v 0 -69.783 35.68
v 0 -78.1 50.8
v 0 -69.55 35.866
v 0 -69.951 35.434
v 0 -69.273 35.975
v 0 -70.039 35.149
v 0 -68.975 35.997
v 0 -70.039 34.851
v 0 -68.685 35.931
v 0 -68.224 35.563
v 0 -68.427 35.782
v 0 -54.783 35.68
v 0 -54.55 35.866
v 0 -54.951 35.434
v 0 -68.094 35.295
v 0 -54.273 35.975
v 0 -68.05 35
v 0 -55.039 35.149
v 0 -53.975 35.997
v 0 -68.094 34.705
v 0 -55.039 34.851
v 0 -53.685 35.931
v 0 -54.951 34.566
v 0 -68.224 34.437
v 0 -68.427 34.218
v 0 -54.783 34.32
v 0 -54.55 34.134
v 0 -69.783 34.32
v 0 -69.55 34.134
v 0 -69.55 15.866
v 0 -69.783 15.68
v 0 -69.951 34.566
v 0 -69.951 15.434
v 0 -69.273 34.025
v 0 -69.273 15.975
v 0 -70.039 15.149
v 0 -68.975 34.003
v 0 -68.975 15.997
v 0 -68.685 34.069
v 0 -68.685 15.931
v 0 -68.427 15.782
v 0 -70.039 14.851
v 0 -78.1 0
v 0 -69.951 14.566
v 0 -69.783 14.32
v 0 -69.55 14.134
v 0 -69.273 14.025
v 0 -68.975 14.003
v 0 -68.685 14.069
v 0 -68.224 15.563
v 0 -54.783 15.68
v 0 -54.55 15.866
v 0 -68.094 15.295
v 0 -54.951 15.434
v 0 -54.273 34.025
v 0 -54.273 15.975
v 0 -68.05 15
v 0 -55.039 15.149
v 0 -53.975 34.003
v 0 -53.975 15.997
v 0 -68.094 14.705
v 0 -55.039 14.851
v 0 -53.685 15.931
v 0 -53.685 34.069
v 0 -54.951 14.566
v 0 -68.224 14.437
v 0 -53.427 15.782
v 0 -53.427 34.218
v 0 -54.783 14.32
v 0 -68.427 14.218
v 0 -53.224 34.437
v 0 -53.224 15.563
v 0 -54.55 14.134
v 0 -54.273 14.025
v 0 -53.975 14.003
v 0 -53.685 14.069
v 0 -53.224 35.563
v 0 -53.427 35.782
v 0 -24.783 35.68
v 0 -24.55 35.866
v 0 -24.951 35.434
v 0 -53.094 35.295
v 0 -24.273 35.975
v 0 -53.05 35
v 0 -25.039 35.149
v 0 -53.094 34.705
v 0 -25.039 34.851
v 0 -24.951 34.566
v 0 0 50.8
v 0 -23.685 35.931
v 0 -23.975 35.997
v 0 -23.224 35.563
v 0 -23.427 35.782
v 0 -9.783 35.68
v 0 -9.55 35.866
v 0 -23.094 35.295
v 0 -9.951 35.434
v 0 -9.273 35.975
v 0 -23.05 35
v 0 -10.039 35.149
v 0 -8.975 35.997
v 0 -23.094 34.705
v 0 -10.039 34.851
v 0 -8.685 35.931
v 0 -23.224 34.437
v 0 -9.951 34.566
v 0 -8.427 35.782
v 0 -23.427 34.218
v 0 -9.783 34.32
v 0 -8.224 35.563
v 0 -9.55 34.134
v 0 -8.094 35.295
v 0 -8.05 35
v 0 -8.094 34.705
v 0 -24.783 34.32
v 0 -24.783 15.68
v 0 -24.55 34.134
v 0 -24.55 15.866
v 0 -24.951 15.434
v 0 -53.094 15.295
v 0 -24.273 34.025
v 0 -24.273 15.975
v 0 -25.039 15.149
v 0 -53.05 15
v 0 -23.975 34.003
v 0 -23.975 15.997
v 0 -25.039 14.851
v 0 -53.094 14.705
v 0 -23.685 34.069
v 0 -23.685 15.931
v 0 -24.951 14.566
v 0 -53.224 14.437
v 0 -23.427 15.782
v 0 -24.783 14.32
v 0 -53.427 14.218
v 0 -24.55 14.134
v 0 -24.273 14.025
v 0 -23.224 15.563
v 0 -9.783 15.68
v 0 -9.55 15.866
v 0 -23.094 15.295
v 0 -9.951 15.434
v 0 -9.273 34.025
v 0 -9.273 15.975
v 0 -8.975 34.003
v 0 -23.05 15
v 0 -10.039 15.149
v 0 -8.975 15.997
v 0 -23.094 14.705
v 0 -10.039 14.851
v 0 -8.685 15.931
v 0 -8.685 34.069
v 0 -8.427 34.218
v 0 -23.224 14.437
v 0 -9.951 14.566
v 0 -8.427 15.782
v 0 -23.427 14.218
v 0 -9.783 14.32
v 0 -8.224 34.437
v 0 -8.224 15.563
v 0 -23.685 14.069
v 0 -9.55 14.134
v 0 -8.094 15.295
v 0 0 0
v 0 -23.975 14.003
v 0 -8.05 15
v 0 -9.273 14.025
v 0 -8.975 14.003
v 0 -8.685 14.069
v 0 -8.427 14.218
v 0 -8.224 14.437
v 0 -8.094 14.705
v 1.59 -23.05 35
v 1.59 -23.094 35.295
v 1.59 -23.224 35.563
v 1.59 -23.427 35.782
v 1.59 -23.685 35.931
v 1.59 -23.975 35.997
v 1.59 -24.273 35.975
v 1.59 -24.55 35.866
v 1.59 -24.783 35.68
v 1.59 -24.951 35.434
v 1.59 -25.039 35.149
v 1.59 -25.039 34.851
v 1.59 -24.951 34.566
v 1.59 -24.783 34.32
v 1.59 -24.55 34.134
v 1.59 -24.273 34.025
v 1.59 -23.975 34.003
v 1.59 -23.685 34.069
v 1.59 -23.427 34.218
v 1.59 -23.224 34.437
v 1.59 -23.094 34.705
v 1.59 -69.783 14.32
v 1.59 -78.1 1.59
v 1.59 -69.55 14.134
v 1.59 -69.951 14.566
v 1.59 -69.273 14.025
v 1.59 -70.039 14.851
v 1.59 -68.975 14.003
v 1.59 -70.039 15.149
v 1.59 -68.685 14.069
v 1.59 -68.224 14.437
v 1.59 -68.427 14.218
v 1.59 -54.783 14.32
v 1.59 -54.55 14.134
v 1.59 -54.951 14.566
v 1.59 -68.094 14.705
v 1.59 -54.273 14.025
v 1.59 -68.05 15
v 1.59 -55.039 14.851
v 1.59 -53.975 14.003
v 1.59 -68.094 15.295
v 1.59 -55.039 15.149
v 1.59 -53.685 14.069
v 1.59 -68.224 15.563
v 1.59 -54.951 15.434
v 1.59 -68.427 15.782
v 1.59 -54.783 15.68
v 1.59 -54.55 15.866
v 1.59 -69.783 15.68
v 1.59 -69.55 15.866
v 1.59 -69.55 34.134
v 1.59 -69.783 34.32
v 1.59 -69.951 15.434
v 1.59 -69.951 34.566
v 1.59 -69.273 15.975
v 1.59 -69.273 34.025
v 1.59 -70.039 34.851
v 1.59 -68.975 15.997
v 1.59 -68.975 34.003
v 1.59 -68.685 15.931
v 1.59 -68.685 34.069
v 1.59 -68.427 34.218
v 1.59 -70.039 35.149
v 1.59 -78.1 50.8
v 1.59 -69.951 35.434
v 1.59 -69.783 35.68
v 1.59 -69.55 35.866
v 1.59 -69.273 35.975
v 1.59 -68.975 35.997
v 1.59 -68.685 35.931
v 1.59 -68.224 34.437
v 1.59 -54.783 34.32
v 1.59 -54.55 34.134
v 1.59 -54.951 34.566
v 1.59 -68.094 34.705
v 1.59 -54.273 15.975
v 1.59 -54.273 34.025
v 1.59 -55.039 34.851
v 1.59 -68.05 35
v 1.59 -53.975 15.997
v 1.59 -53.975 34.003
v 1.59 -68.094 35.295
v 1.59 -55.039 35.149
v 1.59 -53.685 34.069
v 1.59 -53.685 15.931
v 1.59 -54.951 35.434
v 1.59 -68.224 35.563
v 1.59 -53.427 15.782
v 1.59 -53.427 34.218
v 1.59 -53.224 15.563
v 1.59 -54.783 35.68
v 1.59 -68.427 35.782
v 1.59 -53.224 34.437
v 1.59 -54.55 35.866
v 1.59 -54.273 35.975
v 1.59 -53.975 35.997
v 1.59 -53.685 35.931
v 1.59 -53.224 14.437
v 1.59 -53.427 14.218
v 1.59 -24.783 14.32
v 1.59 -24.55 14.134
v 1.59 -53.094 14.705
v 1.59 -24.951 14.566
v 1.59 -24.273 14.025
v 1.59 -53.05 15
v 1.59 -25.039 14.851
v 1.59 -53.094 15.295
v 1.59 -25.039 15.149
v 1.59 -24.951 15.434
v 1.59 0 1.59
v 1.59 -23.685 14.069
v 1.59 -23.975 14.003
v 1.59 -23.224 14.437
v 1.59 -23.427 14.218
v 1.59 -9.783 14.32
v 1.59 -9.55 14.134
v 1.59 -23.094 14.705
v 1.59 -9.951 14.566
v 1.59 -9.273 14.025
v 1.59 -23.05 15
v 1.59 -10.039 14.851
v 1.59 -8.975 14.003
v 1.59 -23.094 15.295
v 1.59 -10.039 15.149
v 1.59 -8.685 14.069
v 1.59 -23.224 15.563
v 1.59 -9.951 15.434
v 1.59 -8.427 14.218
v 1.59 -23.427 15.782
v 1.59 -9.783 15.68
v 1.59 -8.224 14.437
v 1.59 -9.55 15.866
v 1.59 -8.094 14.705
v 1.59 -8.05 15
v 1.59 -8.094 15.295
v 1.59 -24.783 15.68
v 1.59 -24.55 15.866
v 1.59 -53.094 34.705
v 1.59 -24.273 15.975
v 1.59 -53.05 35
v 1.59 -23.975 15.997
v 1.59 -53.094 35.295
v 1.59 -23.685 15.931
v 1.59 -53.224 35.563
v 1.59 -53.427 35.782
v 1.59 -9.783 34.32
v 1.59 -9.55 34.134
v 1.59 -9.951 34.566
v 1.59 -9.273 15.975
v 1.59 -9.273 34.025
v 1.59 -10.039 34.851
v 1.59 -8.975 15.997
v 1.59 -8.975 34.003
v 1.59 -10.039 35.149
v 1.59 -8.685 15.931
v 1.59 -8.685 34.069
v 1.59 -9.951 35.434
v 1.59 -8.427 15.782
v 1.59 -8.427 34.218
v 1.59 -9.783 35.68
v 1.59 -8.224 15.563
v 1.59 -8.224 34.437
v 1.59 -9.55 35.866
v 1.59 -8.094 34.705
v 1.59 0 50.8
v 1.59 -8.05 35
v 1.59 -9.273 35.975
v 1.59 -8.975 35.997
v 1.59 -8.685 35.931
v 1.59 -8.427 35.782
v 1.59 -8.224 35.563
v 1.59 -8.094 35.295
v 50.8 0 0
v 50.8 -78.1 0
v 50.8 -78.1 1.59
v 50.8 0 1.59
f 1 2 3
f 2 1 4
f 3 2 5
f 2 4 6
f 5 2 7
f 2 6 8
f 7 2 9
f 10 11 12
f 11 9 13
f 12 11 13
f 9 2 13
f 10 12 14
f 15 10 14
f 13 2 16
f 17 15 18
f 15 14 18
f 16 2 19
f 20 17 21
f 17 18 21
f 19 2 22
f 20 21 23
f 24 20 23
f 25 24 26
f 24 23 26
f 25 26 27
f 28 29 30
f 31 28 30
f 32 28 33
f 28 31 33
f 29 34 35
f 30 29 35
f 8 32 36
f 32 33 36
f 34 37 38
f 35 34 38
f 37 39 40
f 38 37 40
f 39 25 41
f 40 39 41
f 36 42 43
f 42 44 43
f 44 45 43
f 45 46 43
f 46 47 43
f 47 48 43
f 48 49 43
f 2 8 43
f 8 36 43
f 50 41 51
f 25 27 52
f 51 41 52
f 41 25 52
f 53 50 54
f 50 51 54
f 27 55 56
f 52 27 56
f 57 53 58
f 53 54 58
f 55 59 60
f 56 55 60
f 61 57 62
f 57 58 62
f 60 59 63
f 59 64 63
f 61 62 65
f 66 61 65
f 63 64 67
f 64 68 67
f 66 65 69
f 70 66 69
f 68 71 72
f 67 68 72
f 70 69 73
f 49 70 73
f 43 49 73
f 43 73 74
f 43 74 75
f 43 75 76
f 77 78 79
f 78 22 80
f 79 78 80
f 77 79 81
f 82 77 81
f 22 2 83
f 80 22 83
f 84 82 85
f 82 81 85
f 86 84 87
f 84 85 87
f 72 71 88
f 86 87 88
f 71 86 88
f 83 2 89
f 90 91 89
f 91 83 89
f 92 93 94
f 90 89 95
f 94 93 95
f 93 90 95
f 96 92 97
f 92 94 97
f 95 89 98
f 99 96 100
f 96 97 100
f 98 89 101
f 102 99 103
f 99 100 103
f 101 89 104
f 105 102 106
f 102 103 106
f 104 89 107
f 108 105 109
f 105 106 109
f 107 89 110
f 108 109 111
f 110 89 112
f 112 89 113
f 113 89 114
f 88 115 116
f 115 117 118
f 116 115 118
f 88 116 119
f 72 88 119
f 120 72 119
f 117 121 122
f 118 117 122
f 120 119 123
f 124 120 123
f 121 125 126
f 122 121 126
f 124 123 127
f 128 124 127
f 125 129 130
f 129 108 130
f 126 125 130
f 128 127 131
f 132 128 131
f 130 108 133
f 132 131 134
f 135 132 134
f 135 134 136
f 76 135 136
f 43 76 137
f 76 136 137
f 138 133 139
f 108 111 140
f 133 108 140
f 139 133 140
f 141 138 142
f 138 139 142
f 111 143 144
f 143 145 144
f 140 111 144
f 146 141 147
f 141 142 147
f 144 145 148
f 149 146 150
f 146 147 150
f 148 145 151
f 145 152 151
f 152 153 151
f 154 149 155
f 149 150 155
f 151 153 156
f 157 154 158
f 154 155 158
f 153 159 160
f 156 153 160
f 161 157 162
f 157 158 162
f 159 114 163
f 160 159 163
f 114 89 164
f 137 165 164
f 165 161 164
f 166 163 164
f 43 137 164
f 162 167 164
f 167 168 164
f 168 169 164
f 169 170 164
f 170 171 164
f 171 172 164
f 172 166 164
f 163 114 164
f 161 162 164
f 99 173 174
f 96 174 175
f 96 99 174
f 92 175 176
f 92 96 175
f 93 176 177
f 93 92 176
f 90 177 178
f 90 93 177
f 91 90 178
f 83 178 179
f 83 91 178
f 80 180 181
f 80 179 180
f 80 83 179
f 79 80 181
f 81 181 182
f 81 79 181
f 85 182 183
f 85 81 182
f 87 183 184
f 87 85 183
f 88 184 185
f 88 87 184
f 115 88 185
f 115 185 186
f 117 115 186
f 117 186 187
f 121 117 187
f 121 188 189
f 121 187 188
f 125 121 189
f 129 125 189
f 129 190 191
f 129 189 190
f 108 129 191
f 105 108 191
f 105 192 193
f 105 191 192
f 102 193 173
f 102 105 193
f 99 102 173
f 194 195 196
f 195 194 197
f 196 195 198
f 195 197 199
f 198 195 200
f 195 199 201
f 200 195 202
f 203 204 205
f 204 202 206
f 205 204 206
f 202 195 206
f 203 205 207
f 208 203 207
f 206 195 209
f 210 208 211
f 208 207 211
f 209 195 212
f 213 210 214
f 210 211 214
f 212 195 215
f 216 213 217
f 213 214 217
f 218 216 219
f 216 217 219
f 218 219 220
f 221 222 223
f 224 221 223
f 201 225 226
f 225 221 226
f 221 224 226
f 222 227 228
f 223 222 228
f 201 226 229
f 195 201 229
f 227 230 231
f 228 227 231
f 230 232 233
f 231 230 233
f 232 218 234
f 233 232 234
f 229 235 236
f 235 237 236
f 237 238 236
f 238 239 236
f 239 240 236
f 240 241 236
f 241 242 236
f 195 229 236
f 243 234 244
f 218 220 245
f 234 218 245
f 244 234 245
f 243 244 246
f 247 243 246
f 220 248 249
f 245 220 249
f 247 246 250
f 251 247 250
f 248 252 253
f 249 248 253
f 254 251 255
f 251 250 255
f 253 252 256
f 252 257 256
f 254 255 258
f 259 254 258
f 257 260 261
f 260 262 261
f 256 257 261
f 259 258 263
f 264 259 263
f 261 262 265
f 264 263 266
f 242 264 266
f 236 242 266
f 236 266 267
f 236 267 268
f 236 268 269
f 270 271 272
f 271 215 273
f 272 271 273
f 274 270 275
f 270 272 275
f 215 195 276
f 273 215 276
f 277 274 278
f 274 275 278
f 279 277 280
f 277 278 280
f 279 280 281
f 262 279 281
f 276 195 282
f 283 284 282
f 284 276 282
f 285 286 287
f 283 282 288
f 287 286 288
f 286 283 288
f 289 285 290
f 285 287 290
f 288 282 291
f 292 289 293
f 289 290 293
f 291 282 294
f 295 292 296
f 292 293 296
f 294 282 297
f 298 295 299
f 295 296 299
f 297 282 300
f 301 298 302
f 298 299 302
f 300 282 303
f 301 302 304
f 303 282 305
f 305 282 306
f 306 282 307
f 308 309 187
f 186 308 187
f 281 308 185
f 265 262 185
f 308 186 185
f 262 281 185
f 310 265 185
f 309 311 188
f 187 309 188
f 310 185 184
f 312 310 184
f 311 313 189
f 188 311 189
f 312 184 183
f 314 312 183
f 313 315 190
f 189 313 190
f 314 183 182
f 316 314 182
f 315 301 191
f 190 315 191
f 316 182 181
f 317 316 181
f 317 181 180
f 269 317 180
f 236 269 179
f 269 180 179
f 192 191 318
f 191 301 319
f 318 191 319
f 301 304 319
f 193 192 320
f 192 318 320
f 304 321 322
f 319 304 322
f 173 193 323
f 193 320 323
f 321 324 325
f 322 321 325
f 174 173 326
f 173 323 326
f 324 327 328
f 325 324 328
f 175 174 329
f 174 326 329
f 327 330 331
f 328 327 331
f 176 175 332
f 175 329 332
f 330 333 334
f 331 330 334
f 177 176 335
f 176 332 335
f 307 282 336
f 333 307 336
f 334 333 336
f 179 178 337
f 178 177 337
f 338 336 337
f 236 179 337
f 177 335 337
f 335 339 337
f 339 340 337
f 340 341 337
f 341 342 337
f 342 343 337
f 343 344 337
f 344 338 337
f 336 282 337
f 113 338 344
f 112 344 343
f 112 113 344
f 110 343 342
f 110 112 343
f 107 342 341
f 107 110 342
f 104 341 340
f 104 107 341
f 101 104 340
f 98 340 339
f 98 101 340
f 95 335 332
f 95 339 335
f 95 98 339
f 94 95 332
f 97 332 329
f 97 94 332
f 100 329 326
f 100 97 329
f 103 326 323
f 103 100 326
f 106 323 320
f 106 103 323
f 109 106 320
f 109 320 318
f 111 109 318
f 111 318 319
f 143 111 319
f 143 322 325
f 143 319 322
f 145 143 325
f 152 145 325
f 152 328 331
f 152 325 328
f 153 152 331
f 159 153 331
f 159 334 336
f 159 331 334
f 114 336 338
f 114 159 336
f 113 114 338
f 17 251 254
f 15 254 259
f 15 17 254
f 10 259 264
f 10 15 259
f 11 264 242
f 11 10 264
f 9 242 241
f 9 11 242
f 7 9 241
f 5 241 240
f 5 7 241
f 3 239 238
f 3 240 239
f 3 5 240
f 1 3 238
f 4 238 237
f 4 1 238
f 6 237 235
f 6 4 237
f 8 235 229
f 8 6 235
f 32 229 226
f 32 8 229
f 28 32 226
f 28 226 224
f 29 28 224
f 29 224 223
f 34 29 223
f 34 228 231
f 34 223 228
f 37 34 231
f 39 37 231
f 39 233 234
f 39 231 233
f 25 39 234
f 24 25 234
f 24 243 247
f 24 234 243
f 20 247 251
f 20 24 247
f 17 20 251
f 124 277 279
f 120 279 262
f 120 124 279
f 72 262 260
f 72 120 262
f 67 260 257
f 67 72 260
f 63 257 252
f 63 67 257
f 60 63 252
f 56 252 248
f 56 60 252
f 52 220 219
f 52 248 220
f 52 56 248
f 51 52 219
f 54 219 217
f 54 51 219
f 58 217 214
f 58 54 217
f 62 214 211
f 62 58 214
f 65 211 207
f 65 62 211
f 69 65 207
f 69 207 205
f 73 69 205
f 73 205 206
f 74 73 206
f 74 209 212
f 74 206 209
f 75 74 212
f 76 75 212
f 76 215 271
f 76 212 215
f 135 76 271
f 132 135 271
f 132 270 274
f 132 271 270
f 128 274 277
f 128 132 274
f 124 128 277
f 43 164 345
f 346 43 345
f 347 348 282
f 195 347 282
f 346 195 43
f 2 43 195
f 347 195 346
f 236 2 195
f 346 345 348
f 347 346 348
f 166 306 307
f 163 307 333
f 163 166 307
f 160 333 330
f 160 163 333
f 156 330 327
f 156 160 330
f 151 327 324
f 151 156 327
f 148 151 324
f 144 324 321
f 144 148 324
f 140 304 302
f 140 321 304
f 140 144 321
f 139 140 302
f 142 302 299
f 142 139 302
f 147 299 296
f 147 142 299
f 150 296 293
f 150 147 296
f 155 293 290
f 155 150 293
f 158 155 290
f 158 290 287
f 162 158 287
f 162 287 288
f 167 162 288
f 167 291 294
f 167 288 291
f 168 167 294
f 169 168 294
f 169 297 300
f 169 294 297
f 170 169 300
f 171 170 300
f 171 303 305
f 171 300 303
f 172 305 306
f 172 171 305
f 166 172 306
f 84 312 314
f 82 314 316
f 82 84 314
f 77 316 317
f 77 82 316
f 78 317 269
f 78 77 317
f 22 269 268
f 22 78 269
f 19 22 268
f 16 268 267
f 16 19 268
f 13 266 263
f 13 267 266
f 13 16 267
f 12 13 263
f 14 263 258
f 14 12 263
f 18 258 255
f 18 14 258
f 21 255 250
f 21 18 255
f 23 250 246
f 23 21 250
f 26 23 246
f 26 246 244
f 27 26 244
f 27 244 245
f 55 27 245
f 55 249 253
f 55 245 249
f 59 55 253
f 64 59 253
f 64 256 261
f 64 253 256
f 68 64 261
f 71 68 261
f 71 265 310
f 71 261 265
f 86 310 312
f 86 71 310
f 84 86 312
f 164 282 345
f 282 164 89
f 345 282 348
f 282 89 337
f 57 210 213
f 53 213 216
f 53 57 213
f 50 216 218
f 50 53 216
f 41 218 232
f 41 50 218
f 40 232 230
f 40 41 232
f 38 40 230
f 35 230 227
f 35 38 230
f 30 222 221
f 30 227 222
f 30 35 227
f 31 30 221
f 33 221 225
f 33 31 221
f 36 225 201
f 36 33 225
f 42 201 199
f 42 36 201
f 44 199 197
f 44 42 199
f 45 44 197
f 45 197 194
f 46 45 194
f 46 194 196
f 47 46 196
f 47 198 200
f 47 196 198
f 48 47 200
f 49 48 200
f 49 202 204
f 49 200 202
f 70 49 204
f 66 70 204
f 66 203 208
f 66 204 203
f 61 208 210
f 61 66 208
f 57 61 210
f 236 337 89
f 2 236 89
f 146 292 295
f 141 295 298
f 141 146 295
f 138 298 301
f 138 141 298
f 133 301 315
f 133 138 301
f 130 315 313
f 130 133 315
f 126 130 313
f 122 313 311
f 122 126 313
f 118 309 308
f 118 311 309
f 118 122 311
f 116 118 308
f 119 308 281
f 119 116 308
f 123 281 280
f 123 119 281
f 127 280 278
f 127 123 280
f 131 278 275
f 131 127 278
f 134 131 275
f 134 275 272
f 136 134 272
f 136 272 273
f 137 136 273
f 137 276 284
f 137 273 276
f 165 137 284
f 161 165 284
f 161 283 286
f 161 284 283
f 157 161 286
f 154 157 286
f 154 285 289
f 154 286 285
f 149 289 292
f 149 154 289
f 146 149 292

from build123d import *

# Parameters (mm, degrees)
F1_DEPTH = 78.1
F2_R     = 1
F3_DEPTH = 50.801


with BuildPart() as f1:
    # F0 (on Front) → F1 (new body)
    with BuildSketch(Plane.XZ):
        Polygon((0, 50.8), (0, 0), (50.8, 0), (50.8, 1.59), (1.59, 1.59), (1.59, 50.8), align=None)
    extrude(amount=F1_DEPTH)

    # F2 (on Right) → F3 (cut, through all)
    with BuildSketch(Plane.YZ):
        with Locations((-9.05, 15)):
            Circle(F2_R)
        with Locations((-9.05, 35)):
            Circle(F2_R)
        with Locations((-24.05, 35)):
            Circle(F2_R)
        with Locations((-24.05, 15)):
            Circle(F2_R)
        with Locations((-54.05, 15)):
            Circle(F2_R)
        with Locations((-54.05, 35)):
            Circle(F2_R)
        with Locations((-69.05, 35)):
            Circle(F2_R)
        with Locations((-69.05, 15)):
            Circle(F2_R)
    extrude(amount=F3_DEPTH, mode=Mode.SUBTRACT)


solid = f1.part
